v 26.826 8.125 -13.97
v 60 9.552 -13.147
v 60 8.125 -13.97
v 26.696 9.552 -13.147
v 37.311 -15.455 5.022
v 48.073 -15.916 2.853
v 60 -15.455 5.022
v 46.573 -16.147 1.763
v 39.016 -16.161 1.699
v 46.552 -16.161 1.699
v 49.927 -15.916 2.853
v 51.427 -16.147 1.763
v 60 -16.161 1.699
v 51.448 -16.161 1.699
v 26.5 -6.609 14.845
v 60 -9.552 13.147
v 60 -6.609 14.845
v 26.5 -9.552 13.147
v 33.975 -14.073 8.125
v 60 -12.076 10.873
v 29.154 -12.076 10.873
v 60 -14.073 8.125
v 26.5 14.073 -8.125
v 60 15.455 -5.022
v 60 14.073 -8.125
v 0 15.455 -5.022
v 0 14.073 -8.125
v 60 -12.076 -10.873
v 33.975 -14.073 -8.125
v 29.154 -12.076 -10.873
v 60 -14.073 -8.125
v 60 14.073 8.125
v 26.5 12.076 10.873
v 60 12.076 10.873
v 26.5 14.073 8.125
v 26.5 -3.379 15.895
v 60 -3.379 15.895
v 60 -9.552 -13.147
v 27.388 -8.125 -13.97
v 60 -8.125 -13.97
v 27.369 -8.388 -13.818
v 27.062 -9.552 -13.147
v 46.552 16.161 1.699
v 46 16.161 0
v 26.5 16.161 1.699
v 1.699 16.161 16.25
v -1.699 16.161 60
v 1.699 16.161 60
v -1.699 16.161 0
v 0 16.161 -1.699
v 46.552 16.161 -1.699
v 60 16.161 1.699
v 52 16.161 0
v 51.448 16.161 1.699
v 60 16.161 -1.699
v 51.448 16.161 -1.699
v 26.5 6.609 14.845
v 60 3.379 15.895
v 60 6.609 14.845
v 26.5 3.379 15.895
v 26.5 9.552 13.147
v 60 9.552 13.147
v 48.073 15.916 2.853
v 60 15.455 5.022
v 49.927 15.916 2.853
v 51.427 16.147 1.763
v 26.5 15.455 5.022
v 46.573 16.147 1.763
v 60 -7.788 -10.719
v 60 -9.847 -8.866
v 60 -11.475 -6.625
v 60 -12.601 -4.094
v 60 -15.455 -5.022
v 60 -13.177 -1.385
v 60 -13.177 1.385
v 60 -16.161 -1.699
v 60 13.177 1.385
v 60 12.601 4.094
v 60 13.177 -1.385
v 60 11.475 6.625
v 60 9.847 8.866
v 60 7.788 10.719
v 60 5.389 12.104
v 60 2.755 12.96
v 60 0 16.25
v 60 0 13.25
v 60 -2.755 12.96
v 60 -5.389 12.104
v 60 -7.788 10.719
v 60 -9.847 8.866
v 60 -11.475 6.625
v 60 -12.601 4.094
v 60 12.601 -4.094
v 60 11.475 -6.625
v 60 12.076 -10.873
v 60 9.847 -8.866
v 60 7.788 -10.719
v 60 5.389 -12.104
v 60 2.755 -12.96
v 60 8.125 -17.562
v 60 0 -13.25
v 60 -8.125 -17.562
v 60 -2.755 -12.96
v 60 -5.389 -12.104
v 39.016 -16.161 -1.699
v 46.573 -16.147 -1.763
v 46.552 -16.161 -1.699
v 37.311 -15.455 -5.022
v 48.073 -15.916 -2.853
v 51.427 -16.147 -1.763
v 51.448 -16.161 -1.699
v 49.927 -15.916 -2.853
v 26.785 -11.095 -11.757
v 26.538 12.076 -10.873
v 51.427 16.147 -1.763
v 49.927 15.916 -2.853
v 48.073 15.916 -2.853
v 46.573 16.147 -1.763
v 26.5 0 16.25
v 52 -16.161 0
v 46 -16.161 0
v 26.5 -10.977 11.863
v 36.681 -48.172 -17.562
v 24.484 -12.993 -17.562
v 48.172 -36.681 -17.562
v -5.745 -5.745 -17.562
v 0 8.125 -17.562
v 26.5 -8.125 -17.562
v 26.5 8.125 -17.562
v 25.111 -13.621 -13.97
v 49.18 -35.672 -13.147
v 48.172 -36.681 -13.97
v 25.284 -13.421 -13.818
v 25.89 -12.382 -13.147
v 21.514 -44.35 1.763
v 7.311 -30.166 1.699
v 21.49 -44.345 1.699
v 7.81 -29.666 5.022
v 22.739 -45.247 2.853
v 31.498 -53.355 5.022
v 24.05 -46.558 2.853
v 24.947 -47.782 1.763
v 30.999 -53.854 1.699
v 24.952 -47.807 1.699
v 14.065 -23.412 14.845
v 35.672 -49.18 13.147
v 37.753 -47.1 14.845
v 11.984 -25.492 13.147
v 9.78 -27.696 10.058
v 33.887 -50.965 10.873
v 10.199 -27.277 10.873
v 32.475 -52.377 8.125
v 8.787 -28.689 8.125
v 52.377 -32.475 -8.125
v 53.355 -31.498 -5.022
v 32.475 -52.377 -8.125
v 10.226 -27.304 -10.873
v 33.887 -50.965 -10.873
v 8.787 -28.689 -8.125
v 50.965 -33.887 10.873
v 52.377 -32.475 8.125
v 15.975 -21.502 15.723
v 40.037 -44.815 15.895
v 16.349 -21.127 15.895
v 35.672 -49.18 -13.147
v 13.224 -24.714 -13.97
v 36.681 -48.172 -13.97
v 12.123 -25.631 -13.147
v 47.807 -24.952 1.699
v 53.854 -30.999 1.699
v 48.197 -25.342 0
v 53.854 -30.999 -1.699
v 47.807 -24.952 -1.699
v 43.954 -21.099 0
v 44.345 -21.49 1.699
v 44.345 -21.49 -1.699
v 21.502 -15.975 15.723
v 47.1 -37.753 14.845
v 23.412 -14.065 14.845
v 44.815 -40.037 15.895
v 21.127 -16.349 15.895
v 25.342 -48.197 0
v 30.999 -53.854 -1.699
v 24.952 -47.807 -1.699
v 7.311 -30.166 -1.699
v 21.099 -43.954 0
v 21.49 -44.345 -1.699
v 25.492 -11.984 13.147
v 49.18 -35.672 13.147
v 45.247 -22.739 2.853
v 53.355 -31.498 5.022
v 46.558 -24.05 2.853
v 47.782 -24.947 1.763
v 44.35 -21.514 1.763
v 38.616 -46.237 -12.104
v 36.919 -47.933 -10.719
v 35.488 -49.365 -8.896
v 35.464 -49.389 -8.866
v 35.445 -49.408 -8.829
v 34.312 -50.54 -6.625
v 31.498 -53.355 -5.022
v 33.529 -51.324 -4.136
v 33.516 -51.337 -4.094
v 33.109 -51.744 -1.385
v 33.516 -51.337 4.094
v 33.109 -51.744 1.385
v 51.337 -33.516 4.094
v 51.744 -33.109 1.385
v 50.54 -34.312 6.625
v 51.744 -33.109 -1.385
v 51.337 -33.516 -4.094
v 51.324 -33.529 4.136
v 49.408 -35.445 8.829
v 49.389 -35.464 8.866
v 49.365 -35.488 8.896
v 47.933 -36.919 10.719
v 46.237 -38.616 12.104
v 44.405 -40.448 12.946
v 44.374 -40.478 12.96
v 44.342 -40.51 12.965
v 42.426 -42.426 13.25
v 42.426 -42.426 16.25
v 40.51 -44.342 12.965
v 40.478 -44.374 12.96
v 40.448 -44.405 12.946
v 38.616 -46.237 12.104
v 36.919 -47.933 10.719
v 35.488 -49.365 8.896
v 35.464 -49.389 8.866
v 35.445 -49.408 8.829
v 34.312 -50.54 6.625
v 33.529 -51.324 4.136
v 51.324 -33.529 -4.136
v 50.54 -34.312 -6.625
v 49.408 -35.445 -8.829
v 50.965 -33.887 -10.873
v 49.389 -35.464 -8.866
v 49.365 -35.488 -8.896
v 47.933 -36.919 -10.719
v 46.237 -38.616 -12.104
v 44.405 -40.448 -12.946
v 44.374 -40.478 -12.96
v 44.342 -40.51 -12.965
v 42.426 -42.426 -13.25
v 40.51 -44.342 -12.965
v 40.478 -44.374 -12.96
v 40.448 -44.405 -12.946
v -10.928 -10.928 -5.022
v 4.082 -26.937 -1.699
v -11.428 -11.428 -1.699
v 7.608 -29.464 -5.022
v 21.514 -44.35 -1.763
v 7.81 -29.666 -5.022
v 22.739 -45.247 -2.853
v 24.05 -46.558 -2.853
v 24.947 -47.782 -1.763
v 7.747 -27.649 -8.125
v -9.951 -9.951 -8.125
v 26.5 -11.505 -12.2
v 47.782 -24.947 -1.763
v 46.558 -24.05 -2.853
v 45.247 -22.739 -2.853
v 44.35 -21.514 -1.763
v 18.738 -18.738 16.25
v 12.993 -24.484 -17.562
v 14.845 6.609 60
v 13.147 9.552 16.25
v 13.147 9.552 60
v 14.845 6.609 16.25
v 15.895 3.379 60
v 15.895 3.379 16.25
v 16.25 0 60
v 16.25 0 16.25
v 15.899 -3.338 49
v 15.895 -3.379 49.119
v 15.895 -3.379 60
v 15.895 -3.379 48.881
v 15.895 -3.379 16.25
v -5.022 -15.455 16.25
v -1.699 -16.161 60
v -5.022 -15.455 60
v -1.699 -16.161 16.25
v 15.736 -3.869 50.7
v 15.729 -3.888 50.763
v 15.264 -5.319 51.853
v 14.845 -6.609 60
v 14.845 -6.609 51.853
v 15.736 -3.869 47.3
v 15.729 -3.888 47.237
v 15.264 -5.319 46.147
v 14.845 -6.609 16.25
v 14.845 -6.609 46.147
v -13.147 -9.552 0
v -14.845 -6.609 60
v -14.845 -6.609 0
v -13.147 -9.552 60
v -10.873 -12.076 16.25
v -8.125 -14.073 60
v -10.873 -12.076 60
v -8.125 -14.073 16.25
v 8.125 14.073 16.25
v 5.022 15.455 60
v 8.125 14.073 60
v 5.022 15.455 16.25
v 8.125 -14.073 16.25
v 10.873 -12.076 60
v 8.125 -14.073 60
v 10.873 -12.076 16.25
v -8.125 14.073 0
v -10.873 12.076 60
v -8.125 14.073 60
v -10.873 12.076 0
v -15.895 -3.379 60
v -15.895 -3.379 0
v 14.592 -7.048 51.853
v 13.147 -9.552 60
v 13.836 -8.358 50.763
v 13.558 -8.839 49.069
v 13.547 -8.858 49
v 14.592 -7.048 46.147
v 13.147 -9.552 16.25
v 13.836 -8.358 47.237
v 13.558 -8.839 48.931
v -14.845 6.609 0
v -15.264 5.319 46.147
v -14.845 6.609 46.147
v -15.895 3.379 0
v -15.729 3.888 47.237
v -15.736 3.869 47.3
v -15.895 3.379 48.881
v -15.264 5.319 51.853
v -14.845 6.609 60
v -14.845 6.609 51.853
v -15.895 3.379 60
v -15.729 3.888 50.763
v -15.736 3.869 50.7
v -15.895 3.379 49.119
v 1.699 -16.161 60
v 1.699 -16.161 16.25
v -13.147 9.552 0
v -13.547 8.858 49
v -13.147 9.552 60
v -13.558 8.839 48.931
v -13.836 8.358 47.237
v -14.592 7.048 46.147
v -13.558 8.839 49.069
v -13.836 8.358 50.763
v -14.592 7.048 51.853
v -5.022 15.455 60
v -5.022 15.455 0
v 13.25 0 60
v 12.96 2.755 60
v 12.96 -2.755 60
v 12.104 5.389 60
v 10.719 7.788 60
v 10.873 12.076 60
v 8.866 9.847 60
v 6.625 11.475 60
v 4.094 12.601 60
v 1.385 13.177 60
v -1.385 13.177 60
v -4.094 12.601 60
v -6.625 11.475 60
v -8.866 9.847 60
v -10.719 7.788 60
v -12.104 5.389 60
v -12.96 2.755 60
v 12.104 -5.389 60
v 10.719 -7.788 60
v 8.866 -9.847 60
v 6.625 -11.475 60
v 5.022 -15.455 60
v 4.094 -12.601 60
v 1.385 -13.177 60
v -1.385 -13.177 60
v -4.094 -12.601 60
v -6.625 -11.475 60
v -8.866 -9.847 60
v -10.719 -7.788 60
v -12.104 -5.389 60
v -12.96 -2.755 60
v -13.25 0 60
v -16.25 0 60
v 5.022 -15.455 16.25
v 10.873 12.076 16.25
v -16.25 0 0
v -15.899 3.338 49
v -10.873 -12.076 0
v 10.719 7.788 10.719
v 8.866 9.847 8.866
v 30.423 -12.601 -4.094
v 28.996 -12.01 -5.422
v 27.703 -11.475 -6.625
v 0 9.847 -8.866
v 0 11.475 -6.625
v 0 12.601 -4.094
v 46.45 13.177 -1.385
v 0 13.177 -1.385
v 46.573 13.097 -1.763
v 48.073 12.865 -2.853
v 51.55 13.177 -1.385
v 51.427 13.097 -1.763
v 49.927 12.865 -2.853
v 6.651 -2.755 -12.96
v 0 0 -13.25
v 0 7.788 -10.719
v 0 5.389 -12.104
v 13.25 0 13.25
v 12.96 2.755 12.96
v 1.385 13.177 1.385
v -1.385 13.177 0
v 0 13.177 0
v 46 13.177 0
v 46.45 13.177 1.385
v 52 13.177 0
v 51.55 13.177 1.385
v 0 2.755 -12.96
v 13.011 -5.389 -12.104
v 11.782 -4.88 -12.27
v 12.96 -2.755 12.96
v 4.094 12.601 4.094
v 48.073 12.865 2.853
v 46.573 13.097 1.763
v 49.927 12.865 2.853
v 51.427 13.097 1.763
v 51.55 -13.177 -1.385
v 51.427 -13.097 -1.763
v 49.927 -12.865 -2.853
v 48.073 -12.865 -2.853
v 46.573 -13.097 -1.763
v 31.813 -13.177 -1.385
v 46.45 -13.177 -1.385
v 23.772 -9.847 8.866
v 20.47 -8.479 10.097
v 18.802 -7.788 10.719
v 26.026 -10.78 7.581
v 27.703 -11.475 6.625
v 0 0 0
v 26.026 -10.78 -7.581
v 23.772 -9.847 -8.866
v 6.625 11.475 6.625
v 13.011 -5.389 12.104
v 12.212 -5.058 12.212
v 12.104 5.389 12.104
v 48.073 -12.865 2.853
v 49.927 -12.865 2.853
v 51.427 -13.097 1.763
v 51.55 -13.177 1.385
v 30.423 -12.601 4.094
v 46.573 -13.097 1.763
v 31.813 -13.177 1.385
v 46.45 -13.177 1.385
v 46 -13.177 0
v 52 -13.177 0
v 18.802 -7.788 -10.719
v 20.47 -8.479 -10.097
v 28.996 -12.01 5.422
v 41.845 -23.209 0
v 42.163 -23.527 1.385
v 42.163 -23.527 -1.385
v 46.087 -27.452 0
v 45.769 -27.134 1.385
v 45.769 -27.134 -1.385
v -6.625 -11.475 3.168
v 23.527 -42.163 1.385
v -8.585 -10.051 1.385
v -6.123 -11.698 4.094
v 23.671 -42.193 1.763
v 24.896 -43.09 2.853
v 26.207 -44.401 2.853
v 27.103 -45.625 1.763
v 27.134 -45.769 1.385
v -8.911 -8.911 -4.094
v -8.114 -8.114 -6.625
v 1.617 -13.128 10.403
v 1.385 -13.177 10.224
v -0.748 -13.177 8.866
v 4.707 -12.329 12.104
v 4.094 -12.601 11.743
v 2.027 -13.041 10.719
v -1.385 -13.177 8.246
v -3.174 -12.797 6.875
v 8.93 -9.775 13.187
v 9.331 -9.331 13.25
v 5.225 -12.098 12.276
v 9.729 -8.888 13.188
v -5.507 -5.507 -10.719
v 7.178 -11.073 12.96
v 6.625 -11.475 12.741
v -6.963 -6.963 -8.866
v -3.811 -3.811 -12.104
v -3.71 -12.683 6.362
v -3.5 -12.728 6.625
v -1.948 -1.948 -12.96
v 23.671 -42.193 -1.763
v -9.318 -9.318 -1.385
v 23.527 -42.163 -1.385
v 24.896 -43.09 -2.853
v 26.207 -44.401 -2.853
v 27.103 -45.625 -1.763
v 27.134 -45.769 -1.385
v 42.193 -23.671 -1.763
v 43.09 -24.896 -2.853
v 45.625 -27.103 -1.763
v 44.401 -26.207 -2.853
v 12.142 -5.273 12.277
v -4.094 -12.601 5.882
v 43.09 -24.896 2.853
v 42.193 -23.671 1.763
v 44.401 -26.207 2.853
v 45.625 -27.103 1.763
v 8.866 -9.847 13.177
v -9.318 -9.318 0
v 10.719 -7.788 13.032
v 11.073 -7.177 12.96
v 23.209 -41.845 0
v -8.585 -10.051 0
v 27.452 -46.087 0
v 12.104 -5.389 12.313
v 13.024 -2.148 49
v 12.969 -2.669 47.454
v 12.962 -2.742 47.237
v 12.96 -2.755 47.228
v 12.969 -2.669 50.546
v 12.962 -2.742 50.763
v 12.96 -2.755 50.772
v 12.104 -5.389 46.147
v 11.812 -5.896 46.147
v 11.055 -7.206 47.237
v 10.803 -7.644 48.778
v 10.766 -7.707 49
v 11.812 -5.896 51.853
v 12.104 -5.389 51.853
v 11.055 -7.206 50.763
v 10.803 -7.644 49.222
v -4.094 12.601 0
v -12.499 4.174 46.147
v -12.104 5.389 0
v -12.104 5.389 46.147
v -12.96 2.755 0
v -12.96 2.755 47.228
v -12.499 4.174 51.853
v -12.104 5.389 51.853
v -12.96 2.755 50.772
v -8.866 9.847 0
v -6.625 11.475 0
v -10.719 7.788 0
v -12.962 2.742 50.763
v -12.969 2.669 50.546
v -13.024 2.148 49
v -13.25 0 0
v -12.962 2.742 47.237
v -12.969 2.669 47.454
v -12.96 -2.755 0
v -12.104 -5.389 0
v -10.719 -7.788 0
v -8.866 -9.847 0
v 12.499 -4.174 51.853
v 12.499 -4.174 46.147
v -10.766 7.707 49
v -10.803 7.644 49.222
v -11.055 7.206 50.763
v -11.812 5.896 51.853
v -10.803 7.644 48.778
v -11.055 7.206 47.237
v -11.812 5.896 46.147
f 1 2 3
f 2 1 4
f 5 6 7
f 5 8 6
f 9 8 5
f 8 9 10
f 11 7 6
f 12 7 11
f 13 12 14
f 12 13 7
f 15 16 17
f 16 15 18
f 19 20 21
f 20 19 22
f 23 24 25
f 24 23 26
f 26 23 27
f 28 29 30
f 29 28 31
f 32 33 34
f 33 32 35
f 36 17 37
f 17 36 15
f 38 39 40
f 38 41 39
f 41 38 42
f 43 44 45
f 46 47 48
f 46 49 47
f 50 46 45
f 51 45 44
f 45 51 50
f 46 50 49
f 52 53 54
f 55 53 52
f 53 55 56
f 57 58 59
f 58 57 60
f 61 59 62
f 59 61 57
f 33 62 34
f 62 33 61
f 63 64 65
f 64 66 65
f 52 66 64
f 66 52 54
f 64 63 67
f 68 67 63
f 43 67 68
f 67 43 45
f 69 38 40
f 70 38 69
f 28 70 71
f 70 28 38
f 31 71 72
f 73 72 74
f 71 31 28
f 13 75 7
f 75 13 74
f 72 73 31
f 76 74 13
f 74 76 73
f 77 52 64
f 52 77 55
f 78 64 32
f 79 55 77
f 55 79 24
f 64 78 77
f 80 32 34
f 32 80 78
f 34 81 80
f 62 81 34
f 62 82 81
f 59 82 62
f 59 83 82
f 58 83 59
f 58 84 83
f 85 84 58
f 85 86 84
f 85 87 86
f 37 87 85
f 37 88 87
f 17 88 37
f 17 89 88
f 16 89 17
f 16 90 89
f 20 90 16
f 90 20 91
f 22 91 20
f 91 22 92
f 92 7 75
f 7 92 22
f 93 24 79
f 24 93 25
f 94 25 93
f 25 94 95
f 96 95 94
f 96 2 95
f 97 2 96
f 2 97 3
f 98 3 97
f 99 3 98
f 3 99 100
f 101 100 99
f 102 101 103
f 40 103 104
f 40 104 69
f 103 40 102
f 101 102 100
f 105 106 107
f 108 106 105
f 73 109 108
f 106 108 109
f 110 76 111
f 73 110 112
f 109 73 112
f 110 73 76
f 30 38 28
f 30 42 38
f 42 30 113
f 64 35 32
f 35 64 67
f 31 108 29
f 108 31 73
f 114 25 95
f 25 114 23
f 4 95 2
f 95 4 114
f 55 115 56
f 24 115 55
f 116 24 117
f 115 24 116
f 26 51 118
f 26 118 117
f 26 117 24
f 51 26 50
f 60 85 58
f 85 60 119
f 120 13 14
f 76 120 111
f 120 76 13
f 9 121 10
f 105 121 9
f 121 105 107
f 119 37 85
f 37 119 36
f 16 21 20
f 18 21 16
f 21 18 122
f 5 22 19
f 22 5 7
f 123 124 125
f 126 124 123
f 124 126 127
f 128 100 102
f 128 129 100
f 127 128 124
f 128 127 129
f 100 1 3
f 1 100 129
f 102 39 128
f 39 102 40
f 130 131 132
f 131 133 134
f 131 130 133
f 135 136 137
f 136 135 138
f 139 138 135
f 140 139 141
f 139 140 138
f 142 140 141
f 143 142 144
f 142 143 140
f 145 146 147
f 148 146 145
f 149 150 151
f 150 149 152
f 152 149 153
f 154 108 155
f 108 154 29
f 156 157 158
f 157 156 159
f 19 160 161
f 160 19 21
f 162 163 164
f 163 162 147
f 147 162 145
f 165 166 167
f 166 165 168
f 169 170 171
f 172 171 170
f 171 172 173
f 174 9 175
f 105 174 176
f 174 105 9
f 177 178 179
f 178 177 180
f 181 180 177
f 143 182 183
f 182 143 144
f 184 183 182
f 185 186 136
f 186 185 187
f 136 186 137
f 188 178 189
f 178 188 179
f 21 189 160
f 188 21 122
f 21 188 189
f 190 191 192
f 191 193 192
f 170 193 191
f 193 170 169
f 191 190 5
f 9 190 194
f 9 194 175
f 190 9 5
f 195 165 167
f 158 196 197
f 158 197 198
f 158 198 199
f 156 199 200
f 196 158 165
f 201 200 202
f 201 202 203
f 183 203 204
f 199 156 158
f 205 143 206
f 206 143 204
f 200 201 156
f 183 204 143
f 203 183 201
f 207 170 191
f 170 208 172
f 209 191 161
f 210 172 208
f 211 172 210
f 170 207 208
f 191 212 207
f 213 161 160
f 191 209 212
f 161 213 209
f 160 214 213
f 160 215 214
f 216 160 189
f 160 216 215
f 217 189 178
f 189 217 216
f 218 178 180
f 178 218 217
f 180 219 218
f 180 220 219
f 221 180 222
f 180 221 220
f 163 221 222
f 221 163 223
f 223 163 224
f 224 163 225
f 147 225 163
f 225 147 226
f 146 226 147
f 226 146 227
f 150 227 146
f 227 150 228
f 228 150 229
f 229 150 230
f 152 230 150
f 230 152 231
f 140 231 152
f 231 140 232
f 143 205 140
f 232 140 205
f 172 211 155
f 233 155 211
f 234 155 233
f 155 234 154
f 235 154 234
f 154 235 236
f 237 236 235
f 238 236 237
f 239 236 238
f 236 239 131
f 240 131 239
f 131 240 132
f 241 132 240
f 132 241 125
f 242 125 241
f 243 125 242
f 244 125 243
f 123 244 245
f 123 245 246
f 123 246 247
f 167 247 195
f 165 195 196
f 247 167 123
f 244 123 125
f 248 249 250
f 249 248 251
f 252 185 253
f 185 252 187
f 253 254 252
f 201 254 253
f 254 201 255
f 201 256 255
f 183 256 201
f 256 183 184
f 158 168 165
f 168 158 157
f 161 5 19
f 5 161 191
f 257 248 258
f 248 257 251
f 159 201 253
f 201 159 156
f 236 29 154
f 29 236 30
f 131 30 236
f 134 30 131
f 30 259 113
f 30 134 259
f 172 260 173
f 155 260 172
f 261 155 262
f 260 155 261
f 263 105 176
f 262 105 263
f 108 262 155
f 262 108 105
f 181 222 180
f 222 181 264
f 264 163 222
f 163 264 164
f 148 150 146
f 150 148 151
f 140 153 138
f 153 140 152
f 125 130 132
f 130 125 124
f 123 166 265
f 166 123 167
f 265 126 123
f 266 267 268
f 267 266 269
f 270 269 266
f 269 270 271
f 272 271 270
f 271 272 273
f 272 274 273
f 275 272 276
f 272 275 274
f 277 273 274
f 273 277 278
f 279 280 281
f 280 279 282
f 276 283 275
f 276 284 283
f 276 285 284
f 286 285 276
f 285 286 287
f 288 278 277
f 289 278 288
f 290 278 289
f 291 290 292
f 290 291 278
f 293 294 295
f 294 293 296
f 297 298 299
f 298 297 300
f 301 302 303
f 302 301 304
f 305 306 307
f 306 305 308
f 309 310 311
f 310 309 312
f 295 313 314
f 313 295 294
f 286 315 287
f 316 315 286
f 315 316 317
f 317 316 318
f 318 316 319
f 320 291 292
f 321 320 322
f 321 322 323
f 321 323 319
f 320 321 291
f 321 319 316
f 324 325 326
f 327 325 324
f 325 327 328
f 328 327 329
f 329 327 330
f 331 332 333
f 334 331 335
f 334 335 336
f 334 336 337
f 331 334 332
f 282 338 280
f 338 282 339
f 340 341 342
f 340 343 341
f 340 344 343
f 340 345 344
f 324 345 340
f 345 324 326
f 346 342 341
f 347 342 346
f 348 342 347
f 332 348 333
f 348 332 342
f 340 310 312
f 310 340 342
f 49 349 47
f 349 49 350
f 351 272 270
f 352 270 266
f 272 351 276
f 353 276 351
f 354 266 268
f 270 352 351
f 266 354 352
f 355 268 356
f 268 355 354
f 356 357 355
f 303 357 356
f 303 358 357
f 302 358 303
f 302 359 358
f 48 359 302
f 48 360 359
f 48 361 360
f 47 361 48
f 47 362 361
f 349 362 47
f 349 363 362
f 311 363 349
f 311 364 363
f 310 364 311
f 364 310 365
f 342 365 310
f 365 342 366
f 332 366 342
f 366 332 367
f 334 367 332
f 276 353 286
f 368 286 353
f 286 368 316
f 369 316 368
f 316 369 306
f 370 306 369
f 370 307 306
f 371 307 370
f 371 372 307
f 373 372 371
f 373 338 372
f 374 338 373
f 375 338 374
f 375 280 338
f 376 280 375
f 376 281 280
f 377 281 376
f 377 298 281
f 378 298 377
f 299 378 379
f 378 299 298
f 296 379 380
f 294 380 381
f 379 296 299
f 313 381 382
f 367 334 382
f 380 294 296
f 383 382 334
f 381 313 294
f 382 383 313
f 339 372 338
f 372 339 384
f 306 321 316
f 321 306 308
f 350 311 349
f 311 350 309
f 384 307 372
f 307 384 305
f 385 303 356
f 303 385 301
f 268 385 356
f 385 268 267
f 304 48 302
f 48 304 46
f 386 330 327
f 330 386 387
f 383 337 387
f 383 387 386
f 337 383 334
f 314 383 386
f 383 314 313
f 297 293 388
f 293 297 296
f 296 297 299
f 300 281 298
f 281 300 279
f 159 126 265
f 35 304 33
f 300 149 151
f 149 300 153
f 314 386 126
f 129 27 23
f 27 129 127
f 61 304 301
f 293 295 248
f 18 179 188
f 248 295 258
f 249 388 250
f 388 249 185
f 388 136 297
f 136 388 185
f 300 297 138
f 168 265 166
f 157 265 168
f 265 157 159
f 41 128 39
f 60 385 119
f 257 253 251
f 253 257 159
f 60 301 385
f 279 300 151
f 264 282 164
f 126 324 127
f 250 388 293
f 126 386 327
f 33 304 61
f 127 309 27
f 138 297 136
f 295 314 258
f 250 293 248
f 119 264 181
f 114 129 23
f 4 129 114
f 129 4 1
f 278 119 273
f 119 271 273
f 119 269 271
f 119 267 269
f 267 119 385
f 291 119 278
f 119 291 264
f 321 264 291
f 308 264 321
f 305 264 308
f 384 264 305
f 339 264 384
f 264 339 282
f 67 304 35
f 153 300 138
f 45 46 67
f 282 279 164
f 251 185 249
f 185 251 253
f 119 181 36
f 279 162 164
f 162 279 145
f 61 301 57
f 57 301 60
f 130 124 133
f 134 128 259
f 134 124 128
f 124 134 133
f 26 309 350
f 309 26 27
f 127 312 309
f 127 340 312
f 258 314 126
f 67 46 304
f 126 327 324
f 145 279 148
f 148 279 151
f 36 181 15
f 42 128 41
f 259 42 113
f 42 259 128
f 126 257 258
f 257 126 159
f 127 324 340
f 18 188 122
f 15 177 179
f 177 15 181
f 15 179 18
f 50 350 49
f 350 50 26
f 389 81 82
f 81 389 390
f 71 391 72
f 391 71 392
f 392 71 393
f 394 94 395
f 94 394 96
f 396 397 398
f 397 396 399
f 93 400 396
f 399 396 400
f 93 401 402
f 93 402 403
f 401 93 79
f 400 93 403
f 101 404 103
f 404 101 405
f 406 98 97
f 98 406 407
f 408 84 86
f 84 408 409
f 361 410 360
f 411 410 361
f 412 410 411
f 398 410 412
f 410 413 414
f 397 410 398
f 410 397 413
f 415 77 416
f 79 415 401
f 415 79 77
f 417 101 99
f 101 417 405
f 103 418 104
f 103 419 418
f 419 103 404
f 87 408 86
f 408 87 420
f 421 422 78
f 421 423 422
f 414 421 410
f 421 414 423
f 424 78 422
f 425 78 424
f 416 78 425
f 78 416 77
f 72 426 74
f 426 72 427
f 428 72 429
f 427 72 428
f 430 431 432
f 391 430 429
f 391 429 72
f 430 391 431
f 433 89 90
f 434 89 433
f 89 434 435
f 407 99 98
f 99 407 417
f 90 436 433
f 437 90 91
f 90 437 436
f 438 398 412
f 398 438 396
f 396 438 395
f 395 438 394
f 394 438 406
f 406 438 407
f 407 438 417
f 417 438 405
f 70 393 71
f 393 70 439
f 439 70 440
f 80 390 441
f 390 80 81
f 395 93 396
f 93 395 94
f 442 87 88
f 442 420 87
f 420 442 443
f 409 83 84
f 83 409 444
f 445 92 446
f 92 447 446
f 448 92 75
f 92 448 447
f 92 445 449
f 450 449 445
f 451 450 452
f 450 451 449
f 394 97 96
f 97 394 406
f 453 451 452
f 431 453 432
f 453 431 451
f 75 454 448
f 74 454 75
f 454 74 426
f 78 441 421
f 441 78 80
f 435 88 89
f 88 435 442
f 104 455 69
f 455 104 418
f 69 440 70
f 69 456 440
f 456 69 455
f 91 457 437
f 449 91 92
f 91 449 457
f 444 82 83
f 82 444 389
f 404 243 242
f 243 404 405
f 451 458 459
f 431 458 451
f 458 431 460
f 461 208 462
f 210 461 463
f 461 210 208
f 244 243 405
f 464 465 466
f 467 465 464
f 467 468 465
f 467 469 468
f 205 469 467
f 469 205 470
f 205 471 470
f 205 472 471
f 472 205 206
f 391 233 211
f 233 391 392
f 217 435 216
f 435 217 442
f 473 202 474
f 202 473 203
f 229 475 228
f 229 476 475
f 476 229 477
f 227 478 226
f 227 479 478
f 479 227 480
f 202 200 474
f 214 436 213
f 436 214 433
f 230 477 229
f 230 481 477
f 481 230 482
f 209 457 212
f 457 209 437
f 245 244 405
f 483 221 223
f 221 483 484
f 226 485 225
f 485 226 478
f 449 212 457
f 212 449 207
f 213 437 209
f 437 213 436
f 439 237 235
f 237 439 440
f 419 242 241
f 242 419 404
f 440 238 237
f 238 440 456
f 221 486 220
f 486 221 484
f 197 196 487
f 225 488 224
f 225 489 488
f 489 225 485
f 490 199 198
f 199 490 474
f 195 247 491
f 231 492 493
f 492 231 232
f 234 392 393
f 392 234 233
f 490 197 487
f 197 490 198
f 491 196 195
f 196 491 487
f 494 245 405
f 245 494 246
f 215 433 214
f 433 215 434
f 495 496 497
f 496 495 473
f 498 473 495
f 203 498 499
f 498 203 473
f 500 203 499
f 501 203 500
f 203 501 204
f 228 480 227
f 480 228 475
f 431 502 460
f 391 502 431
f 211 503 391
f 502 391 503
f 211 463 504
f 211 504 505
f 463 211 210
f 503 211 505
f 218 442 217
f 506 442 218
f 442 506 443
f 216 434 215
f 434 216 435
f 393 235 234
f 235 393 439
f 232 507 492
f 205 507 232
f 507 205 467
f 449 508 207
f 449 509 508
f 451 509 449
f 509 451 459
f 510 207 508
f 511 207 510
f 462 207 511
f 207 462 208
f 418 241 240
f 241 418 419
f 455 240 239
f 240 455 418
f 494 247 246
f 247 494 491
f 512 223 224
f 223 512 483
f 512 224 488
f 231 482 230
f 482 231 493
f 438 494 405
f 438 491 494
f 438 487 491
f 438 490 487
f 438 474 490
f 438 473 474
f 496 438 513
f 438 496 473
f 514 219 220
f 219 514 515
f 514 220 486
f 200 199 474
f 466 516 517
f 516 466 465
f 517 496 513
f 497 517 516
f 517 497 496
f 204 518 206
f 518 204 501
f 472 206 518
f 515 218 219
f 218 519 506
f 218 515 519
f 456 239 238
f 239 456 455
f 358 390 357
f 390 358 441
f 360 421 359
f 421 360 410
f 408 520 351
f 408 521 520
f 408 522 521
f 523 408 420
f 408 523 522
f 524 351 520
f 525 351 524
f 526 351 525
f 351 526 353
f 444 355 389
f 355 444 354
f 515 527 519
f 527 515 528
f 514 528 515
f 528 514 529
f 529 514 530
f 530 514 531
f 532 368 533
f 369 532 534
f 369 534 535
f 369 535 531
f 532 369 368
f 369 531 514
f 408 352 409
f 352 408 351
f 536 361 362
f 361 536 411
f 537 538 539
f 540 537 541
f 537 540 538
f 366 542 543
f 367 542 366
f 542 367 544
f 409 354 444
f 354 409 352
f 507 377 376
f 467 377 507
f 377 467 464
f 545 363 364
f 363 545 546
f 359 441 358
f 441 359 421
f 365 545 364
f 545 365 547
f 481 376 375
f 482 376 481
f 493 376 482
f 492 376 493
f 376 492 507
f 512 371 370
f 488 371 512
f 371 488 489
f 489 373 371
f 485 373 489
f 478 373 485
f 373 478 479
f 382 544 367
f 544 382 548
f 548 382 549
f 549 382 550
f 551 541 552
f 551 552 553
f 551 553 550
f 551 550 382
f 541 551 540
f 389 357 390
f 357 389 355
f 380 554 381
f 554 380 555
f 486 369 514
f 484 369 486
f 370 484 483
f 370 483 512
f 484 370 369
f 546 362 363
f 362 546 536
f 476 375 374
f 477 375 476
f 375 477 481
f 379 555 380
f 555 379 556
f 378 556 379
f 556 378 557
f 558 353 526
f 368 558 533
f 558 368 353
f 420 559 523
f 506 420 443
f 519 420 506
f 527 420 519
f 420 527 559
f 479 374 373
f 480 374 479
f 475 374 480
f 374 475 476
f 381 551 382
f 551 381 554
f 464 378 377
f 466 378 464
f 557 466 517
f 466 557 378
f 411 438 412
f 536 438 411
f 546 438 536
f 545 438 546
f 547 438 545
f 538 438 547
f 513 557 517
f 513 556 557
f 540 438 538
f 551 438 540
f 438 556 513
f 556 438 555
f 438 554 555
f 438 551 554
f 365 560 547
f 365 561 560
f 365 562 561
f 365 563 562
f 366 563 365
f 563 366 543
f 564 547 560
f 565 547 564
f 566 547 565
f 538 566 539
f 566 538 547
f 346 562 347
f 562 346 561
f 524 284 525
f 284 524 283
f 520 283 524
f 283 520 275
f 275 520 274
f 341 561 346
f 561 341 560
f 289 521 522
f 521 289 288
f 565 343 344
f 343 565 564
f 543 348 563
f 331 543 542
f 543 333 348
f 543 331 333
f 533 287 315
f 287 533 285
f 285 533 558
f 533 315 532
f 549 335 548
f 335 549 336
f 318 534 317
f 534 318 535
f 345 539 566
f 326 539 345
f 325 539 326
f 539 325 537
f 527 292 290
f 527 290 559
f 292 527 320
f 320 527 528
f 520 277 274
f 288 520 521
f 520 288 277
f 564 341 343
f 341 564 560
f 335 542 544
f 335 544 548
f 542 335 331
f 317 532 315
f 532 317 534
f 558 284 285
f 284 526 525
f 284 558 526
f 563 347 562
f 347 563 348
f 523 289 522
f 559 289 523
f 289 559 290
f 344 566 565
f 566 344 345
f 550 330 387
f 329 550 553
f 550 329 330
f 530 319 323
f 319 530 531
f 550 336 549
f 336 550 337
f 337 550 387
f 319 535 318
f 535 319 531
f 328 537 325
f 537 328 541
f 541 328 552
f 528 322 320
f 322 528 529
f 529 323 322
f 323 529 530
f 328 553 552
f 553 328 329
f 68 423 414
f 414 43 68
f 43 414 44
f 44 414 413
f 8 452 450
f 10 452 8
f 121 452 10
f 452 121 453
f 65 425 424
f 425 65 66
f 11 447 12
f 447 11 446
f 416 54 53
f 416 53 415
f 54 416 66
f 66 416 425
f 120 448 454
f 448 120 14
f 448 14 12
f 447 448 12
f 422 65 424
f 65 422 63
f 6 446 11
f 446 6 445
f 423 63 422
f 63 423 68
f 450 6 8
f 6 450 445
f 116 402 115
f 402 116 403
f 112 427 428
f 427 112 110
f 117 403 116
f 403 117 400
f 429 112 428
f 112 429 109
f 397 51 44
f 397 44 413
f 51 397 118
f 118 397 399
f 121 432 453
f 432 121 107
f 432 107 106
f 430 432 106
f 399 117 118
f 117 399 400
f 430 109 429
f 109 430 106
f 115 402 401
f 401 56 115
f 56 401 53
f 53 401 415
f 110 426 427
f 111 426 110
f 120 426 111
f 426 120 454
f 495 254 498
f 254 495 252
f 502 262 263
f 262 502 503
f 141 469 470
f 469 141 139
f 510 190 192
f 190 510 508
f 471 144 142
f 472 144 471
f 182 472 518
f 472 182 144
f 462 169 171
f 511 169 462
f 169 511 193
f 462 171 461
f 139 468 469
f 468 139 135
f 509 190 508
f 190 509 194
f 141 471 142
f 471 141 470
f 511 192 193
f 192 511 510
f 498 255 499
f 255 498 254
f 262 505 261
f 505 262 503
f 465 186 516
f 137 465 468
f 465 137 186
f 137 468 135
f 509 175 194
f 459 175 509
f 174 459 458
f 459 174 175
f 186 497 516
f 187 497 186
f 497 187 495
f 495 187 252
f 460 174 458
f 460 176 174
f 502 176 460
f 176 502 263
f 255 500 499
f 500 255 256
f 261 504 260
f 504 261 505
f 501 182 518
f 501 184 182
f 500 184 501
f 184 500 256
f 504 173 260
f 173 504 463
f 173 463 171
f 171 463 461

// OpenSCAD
// file: three-way-connector.scad
module limb(outer_radius, diameter, length, inner){
	cylinder(r = outer_radius, h = length, center = false);
    if(inner) translate([diameter/2,0,length/2]) cube(size = [outer_radius/2+0.5, outer_radius, length], center=true);
}

module three_way_connector(diameter, thickness, length, x_y_angle)
{
	outer_radius = (diameter + (thickness * 2)) / 2;
	inner_radius = outer_radius - thickness;

	union() {
		difference() {
			union() {
			    // Outer cylinders
			    translate(0,0,length-diameter/2) cylinder(r = outer_radius, h = length , center = false);

				rotate([0, 90, 0]){
				    cylinder(r = outer_radius, h = length, center = false);
                        limb(outer_radius, diameter, length, inner=true);
				    rotate([x_y_angle,0,0]){
                        limb(outer_radius, diameter, length, inner=true);
				    }
				}
			    // Make the bottom a bit thicker so it has better bed adhesion and less of an angle to go

				//This is just to cover the gap in the corner in a tidy way
				hull(){
				     translate(0,0,length-diameter/2) cylinder(r = outer_radius, h = outer_radius , center = false);
				     rotate([0, 90, 0]){
                             limb(outer_radius, diameter, diameter, inner=true);
				         rotate([x_y_angle,0,0]){
                             limb(outer_radius, diameter, diameter, inner=true);
				         }
				     }
				}
			}

            // Inner cylinders - to hollow out the outer ones
			translate(0,0,length-diameter/2-1) cylinder(r = inner_radius, h = (length * 2 + 3), center = false);
				rotate([0, 90, 0]){
                    limb(inner_radius, diameter, length+1, inner=false);
				    rotate([x_y_angle,0,0]){
                        limb(inner_radius, diameter, length+1, inner=false);
				    }
				}


		}
	}
}

three_way_connector(17, 3, 40, 45);
// main file
use <three-way-connector.scad>;

module pin(length, pin_position, pin_length, pin_diameter){
    translate([length-pin_position-1,pin_length/2,0]) rotate([90, 0,0]) cylinder(r = pin_diameter, h = pin_length, center = false);
}
module threee_way_connector_with_pins(diameter, //diameter of the pipe this is going on
 thickness, //thickness of the sleve
 length, //length of the "prongs" of the sleve"
 x_y_angle, //angle between the x and y prongs
 pin_diameter, //diameter of the pin which will secure the hub to the pipe
 pin_position){ //offest out from the side of the sleeve for where the pin will go
    pin_length = (diameter+thickness)+5;

    difference(){
         three_way_connector(diameter, thickness, length, x_y_angle);

        union(){
            //top pin
           rotate([0, 0,90-x_y_angle/2]) translate([0,pin_length/2,length-pin_position-1]) rotate([90, 0,0]) cylinder(r = pin_diameter, h = pin_length, center = false);


           pin(length, pin_position, pin_length, pin_diameter);
           color("red") mirror([sin(x_y_angle/2),cos(x_y_angle/2), 0])            pin(length, pin_position, pin_length, pin_diameter);


            //z pin


            //translate(0,0,length-diameter/2-1) cylinder(r = inner_radius, h = (length * 2 + 3), center = false);
            //rotate([x_y_angle, 0, 0]) cylinder(r = inner_radius, h = (length + 1), center = false);
            //rotate([0, 90, 0]) cylinder(r = inner_radius, h = (length + 1), center = false);

        }
    }
}
//outer diameter = 26.6
threee_way_connector_with_pins(26.5, 3, 60, 45, 3, 10);
